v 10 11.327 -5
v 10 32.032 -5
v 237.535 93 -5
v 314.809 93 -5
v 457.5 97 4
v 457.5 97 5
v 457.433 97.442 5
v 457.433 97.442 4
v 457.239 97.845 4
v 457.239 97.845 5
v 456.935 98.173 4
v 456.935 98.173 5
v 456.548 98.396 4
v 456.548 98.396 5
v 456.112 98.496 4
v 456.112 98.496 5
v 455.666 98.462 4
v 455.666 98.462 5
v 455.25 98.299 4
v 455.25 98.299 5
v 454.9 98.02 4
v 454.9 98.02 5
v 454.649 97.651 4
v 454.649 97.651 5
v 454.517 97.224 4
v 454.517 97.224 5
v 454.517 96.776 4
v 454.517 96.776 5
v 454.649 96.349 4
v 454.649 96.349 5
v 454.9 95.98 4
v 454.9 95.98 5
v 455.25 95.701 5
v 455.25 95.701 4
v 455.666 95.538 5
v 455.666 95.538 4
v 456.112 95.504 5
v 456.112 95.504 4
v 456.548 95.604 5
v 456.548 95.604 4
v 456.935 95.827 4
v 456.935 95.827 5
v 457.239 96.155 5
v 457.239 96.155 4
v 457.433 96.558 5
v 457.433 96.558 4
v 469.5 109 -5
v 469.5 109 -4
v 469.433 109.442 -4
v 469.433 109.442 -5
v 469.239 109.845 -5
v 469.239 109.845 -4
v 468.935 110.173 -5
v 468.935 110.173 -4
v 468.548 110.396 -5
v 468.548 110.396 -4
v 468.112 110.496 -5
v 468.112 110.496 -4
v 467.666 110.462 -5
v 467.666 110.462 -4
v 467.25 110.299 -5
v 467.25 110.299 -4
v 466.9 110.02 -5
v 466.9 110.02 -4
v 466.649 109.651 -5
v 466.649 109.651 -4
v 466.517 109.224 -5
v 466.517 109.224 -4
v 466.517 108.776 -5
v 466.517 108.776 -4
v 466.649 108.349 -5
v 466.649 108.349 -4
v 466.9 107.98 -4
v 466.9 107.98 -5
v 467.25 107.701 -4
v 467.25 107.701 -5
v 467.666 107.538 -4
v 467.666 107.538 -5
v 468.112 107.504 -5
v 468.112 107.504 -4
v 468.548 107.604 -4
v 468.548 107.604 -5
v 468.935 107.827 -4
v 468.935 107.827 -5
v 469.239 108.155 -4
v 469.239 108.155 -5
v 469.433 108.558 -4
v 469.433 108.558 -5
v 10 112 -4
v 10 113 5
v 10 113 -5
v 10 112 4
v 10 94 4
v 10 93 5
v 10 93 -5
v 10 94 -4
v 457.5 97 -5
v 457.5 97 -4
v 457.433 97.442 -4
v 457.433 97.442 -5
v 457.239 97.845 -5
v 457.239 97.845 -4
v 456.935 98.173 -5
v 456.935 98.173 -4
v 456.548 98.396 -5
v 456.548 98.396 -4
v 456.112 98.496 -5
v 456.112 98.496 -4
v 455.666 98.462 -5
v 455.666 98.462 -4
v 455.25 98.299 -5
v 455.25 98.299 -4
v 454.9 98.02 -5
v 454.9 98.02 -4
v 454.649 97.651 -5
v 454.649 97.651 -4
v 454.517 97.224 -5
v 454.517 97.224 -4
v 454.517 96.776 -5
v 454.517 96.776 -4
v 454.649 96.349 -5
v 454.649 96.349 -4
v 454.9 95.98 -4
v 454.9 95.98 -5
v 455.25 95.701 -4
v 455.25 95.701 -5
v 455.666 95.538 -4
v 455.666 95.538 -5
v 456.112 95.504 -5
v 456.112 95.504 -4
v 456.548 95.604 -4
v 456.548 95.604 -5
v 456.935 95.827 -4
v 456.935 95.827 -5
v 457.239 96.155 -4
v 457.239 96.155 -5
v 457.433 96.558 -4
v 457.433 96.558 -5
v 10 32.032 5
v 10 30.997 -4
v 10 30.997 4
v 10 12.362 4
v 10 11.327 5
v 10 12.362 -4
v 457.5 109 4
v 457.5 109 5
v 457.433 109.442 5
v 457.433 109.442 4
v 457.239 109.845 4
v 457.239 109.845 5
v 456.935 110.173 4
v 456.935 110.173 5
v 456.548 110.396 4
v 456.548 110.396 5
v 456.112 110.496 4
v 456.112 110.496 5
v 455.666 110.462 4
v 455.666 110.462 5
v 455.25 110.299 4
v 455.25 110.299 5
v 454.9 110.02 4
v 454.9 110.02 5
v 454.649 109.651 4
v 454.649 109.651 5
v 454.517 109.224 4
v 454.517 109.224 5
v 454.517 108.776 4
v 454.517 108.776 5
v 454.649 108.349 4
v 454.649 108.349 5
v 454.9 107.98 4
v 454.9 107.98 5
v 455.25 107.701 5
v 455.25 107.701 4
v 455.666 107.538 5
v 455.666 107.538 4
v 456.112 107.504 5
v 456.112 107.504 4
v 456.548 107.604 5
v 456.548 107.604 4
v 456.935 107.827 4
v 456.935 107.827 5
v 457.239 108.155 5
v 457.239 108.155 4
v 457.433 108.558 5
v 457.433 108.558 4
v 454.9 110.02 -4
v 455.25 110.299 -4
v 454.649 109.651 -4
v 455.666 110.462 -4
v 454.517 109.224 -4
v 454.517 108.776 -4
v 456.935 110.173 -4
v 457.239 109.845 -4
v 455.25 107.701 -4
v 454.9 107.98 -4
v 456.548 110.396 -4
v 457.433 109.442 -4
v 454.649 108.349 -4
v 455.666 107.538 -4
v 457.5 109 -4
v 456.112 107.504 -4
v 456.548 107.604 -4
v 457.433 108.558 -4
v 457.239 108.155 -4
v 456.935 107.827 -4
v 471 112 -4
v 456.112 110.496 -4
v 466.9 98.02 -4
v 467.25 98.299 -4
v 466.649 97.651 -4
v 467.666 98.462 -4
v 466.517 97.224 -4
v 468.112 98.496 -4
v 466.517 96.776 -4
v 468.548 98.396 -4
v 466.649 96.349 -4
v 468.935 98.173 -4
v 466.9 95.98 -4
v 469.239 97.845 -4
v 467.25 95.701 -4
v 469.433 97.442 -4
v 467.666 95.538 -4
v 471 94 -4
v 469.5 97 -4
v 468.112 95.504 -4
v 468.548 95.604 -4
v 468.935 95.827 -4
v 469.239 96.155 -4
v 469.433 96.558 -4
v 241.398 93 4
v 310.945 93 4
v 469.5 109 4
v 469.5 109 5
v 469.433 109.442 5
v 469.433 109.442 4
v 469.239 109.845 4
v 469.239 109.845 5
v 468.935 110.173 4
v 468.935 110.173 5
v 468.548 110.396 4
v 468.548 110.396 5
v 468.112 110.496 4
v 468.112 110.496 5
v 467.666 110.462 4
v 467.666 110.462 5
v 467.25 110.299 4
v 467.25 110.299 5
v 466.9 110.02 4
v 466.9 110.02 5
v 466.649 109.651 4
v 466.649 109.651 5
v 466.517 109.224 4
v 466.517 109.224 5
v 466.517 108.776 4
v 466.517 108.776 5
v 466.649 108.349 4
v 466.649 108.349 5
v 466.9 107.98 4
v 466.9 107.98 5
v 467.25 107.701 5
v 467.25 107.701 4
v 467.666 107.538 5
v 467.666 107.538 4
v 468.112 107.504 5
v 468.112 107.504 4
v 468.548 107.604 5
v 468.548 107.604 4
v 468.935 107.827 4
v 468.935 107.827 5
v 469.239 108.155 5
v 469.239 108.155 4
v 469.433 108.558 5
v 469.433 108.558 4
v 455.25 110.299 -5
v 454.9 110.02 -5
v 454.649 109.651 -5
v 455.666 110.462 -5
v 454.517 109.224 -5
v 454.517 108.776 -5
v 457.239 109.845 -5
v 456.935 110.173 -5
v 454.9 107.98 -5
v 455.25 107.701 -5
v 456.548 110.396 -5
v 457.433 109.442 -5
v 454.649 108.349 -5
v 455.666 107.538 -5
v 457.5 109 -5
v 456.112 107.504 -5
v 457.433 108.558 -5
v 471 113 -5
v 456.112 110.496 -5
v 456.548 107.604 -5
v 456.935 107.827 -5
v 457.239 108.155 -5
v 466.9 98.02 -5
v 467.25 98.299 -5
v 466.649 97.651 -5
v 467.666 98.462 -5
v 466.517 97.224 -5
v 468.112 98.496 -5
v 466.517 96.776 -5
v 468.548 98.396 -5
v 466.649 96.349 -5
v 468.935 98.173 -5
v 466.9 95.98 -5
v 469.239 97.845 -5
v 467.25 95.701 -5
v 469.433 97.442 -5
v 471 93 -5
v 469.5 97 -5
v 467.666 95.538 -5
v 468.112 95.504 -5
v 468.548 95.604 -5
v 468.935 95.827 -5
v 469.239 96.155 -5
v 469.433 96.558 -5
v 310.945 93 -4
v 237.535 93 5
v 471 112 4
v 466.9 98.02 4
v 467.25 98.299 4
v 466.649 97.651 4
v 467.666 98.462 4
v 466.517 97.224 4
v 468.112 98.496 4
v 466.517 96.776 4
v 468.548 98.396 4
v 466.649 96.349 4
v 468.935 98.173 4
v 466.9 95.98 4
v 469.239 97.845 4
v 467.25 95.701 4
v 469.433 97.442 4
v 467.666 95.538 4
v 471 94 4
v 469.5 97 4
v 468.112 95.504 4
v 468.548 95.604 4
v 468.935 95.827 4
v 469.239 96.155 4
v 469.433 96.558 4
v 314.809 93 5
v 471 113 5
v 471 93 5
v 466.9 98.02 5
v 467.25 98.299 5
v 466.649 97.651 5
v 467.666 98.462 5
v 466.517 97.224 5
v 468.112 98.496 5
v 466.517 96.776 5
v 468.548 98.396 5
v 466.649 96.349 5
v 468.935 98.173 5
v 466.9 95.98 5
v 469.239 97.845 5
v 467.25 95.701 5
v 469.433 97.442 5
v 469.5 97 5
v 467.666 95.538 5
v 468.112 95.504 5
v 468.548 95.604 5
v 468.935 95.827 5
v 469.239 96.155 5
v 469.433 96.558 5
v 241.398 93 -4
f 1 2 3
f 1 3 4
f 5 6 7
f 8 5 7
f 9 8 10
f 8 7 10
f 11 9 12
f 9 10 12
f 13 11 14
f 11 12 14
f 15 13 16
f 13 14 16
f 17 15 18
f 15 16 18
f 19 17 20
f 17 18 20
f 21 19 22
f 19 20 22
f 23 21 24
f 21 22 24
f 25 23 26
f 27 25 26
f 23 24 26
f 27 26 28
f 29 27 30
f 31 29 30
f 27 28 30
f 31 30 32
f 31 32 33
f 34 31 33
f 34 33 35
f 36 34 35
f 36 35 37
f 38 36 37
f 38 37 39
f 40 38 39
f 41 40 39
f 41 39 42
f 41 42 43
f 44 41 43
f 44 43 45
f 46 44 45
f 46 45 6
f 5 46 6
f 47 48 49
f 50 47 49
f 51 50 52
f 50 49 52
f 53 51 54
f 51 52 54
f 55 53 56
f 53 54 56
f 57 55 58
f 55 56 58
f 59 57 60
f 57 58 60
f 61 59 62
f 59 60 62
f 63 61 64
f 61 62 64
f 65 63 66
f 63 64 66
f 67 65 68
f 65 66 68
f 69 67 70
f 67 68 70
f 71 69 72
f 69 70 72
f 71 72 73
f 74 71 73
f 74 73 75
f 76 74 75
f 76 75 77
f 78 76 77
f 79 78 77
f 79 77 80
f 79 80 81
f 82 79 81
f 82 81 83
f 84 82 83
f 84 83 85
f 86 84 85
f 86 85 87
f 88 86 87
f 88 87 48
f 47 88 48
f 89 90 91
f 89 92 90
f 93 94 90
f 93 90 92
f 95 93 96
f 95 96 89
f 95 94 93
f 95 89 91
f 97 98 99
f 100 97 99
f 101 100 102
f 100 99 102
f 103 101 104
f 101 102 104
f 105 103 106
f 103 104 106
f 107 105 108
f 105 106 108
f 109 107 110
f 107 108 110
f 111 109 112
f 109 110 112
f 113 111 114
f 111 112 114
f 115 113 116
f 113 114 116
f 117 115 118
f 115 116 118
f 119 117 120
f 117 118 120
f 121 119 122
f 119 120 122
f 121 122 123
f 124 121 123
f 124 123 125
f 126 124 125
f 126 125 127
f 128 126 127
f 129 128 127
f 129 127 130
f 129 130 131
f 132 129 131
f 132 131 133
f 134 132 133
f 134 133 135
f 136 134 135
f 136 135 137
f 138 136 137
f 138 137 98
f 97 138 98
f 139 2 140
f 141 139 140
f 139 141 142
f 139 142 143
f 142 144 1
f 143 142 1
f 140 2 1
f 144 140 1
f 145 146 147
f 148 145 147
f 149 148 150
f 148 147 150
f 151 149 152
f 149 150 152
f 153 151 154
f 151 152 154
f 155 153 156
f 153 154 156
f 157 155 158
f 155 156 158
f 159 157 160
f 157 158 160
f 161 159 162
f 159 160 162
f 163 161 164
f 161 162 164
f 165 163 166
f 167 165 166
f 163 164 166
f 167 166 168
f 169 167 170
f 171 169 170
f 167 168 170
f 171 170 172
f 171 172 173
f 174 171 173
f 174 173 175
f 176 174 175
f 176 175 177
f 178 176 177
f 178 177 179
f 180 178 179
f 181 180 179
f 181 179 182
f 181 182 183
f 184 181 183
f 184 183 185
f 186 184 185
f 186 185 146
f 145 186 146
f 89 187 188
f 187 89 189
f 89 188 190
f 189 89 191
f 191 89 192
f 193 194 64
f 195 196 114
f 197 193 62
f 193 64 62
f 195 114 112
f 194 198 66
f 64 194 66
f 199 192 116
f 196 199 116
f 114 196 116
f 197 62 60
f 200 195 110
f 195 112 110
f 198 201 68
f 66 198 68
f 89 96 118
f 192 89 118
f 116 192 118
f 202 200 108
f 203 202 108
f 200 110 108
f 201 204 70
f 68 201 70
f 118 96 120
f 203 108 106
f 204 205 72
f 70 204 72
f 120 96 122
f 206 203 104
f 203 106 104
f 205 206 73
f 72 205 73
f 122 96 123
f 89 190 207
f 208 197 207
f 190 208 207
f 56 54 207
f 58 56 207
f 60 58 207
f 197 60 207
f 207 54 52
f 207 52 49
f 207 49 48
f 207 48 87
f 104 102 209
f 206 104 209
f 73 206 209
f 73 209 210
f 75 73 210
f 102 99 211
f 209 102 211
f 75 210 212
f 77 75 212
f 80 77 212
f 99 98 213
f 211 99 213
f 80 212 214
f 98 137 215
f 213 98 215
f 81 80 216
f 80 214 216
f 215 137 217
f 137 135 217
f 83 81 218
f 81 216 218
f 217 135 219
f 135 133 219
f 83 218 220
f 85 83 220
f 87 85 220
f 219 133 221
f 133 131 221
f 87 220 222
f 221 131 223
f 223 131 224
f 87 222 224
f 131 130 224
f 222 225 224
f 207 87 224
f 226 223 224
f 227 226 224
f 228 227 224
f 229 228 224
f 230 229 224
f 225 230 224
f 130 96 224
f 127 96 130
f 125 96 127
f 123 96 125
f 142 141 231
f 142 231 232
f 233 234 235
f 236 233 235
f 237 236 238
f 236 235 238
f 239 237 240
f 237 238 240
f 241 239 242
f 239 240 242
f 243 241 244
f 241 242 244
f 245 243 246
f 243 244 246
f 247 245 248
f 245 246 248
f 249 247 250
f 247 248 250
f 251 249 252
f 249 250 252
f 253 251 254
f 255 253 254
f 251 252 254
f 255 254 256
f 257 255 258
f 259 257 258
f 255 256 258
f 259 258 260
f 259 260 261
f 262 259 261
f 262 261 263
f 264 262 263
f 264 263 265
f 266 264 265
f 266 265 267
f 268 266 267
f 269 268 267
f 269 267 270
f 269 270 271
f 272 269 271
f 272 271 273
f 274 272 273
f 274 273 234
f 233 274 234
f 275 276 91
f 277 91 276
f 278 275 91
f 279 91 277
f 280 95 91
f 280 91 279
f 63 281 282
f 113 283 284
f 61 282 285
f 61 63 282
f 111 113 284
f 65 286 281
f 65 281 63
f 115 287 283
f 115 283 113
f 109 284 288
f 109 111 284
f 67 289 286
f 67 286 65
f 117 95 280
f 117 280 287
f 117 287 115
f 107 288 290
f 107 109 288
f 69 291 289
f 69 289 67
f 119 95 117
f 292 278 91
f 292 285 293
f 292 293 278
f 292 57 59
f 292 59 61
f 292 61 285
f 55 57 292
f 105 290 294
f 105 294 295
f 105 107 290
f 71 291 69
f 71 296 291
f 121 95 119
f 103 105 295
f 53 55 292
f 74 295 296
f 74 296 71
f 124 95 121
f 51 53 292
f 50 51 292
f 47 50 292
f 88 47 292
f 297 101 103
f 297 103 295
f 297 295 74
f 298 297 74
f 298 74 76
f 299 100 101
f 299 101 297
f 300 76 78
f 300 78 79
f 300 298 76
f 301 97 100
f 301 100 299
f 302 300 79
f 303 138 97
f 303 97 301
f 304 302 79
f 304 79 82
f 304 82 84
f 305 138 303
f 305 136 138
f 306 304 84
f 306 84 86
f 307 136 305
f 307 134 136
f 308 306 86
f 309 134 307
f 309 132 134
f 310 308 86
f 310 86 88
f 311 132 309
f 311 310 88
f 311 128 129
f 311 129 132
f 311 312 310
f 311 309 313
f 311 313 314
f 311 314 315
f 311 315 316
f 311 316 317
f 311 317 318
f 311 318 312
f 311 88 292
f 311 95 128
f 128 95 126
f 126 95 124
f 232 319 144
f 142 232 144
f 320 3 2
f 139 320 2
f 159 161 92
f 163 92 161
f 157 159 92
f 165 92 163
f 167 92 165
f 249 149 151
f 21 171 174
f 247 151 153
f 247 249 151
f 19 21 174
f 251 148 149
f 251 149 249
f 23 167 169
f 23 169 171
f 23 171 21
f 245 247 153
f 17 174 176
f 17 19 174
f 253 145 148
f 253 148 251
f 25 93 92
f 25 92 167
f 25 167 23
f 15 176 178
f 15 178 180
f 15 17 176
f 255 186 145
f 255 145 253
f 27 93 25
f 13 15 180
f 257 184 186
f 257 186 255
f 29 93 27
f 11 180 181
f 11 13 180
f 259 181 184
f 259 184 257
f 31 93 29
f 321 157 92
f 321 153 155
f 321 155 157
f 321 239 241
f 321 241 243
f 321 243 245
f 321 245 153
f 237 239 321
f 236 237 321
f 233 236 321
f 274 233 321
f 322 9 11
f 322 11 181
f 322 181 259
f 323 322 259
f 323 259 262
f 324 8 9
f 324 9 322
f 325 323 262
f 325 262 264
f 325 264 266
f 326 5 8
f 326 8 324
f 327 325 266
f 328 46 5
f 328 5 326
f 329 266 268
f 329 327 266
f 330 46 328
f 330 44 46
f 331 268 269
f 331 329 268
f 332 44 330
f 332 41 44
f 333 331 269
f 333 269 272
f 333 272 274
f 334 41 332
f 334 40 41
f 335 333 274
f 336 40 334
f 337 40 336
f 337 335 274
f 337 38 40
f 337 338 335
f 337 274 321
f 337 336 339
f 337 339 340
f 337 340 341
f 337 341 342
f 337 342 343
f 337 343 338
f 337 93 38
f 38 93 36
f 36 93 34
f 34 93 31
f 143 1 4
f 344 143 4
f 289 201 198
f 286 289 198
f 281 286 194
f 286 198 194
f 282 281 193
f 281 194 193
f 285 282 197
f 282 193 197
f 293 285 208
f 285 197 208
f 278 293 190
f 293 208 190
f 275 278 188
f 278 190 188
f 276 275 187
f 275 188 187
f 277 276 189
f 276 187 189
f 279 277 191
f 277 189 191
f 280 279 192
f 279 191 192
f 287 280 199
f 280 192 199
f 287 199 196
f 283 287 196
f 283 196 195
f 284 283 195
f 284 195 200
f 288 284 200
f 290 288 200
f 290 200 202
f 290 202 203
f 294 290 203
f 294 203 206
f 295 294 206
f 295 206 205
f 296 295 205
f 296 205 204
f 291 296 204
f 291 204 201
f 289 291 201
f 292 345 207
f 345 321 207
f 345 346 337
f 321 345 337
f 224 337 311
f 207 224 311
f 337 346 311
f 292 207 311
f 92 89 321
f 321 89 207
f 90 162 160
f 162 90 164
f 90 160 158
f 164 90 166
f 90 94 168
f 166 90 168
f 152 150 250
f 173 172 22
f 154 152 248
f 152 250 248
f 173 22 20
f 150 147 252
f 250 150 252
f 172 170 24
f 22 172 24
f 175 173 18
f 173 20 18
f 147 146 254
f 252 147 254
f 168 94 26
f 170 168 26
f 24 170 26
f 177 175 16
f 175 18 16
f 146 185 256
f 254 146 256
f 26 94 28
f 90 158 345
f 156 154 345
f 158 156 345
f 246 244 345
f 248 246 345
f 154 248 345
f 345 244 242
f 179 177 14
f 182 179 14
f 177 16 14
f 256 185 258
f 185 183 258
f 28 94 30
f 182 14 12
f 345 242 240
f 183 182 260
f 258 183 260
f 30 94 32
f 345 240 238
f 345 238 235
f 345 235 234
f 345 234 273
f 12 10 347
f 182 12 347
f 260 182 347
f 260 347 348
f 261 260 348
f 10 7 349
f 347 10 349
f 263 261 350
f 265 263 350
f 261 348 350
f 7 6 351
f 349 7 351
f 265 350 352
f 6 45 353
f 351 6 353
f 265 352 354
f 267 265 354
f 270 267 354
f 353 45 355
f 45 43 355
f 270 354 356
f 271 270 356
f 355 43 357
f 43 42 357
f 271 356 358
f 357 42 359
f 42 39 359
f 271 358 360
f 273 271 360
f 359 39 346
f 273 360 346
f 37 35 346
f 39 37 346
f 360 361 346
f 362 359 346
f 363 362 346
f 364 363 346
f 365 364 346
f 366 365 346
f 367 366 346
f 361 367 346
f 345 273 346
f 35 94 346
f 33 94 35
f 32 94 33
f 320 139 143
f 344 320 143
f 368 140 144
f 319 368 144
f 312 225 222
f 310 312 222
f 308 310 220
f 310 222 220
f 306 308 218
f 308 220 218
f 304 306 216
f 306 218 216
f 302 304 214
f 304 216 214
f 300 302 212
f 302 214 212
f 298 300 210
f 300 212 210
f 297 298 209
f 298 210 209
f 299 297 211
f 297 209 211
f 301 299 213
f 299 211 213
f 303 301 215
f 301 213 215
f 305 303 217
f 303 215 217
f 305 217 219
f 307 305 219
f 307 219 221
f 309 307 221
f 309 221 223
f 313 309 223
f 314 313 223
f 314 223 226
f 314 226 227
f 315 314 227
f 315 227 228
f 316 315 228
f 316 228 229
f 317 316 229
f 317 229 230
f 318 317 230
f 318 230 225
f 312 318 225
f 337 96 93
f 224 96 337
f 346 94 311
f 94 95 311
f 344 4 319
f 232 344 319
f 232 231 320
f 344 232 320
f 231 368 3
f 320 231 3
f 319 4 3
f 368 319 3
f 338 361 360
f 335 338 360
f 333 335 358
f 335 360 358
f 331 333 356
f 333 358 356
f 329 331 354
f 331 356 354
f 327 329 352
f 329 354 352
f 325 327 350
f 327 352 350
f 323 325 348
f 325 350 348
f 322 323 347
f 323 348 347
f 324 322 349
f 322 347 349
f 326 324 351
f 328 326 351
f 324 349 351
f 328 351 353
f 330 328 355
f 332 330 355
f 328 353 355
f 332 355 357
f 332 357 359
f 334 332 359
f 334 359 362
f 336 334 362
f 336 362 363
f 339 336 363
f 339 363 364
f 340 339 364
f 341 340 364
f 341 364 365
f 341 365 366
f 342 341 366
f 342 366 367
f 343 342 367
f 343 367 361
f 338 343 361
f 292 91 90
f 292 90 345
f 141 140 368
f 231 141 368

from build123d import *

# Parameters (mm, degrees)
HS_START                 = -5
HS_10X20X1_1_DEPTH       = 1
HS_START_2               = 4
HS_10X20X1_1_2_DEPTH     = 1
HS_START_3               = -4
HS_10X20X1_1_3_DEPTH     = 8
HS_START_4               = 93
HS_10X20X1_1_4_OUTLINE_W = 461
HS_10X20X1_1_4_OUTLINE_H = 1
HS_10X20X1_1_4_DEPTH     = 20
HS_10X20X1_1_5_OUTLINE_W = 461
HS_10X20X1_1_5_OUTLINE_H = 8
HS_10X20X1_1_5_DEPTH     = 1
HS_START_5               = 112
HS_10X20X1_1_6_OUTLINE_W = 461
HS_10X20X1_1_6_OUTLINE_H = 8
HS_10X20X1_1_6_DEPTH     = 1
HS_START_6               = -10
HS_10X20X1_1_7_OUTLINE_W = 116
HS_10X20X1_1_7_OUTLINE_H = 1
HS_10X20X1_1_7_DEPTH     = 20
HS_10X20X1_1_8_OUTLINE_W = 116
HS_10X20X1_1_8_OUTLINE_H = 8
HS_10X20X1_1_8_DEPTH     = 1
HS_START_7               = 9
HS_10X20X1_1_9_OUTLINE_W = 116
HS_10X20X1_1_9_OUTLINE_H = 8
HS_10X20X1_1_9_DEPTH     = 1
SKETCH_2_W               = 20
SKETCH_2_H               = 116
CUT_EXTRUDE_1_DEPTH      = 10
SKETCH_4_R               = 1.5
CUT_EXTRUDE_3_DEPTH      = 41


# Read off the part's stored shape, not the designer's step: Hs 10X20X1(1)
with BuildPart() as part:
    # Hs 10X20X1(1) outline → Hs 10X20X1(1) (new body)
    with BuildSketch(Plane.XY.offset(HS_START)):
        Polygon((10, 32.032253728), (10, 11.32673012), (314.808792812, 93), (237.534726709, 93), align=None)
    extrude(amount=HS_10X20X1_1_DEPTH)

    # Hs 10X20X1_1 2 outline → Hs 10X20X1_1 2 (add)
    with BuildSketch(Plane.XY.offset(HS_START_2)):
        Polygon((10, 32.032253728), (10, 11.32673012), (314.808792812, 93), (237.534726709, 93), align=None)
    extrude(amount=HS_10X20X1_1_2_DEPTH)

    # Hs 10X20X1_1 3 outline → Hs 10X20X1_1 3 (add)
    with BuildSketch(Plane.XY.offset(HS_START_3)):
        Polygon((10, 32.032253728), (10, 30.996977548), (241.398430014, 93), (237.534726709, 93), align=None)
        Polygon((310.945089507, 93), (10, 12.362006301), (10, 11.32673012), (314.808792812, 93), align=None)
    extrude(amount=HS_10X20X1_1_3_DEPTH)


with BuildPart() as body_2:
    # Hs 10X20X1_1 4 outline → Hs 10X20X1_1 4 (new body)
    with BuildSketch(Plane(origin=(0, 0, 0), x_dir=(1, 0, 0), z_dir=(0, 1, 0)).offset(HS_START_4)):
        with Locations((240.5, -4.5)):
            Rectangle(HS_10X20X1_1_4_OUTLINE_W, HS_10X20X1_1_4_OUTLINE_H)
        with Locations((240.5, 4.5)):
            Rectangle(HS_10X20X1_1_4_OUTLINE_W, HS_10X20X1_1_4_OUTLINE_H)
    extrude(amount=HS_10X20X1_1_4_DEPTH)

    # Hs 10X20X1_1 5 outline → Hs 10X20X1_1 5 (add)
    with BuildSketch(Plane(origin=(0, 0, 0), x_dir=(1, 0, 0), z_dir=(0, 1, 0)).offset(HS_START_4)):
        with Locations((240.5, 0)):
            Rectangle(HS_10X20X1_1_5_OUTLINE_W, HS_10X20X1_1_5_OUTLINE_H)
    extrude(amount=HS_10X20X1_1_5_DEPTH)

    # Hs 10X20X1_1 6 outline → Hs 10X20X1_1 6 (add)
    with BuildSketch(Plane(origin=(0, 0, 0), x_dir=(1, 0, 0), z_dir=(0, 1, 0)).offset(HS_START_5)):
        with Locations((240.5, 0)):
            Rectangle(HS_10X20X1_1_6_OUTLINE_W, HS_10X20X1_1_6_OUTLINE_H)
    extrude(amount=HS_10X20X1_1_6_DEPTH)

    # 草图4 → 切除-拉伸3 (cut)
    with BuildSketch(Plane.XY.offset(5)):
        with Locations((456, 109)):
            Circle(SKETCH_4_R)
        with Locations((456, 97)):
            Circle(SKETCH_4_R)
        with Locations((468, 97)):
            Circle(SKETCH_4_R)
        with Locations((468, 109)):
            Circle(SKETCH_4_R)
    extrude(amount=-CUT_EXTRUDE_3_DEPTH, mode=Mode.SUBTRACT)


with BuildPart() as body_3:
    # Hs 10X20X1_1 7 outline → Hs 10X20X1_1 7 (new body)
    with BuildSketch(Plane.YZ.offset(HS_START_6)):
        with Locations((58, -4.5)):
            Rectangle(HS_10X20X1_1_7_OUTLINE_W, HS_10X20X1_1_7_OUTLINE_H)
        with Locations((58, 4.5)):
            Rectangle(HS_10X20X1_1_7_OUTLINE_W, HS_10X20X1_1_7_OUTLINE_H)
    extrude(amount=HS_10X20X1_1_7_DEPTH)

    # Hs 10X20X1_1 8 outline → Hs 10X20X1_1 8 (add)
    with BuildSketch(Plane.YZ.offset(HS_START_6)):
        with Locations((58, 0)):
            Rectangle(HS_10X20X1_1_8_OUTLINE_W, HS_10X20X1_1_8_OUTLINE_H)
    extrude(amount=HS_10X20X1_1_8_DEPTH)

    # Hs 10X20X1_1 9 outline → Hs 10X20X1_1 9 (add)
    with BuildSketch(Plane.YZ.offset(HS_START_7)):
        with Locations((58, 0)):
            Rectangle(HS_10X20X1_1_9_OUTLINE_W, HS_10X20X1_1_9_OUTLINE_H)
    extrude(amount=HS_10X20X1_1_9_DEPTH)

    # 草图2 → 切除-拉伸1 (cut)
    with BuildSketch(Plane.XY.offset(5)):
        with Locations((0, 58)):
            Rectangle(SKETCH_2_W, SKETCH_2_H)
    extrude(amount=-CUT_EXTRUDE_1_DEPTH, mode=Mode.SUBTRACT)


solid = Compound([part.part, body_2.part])
